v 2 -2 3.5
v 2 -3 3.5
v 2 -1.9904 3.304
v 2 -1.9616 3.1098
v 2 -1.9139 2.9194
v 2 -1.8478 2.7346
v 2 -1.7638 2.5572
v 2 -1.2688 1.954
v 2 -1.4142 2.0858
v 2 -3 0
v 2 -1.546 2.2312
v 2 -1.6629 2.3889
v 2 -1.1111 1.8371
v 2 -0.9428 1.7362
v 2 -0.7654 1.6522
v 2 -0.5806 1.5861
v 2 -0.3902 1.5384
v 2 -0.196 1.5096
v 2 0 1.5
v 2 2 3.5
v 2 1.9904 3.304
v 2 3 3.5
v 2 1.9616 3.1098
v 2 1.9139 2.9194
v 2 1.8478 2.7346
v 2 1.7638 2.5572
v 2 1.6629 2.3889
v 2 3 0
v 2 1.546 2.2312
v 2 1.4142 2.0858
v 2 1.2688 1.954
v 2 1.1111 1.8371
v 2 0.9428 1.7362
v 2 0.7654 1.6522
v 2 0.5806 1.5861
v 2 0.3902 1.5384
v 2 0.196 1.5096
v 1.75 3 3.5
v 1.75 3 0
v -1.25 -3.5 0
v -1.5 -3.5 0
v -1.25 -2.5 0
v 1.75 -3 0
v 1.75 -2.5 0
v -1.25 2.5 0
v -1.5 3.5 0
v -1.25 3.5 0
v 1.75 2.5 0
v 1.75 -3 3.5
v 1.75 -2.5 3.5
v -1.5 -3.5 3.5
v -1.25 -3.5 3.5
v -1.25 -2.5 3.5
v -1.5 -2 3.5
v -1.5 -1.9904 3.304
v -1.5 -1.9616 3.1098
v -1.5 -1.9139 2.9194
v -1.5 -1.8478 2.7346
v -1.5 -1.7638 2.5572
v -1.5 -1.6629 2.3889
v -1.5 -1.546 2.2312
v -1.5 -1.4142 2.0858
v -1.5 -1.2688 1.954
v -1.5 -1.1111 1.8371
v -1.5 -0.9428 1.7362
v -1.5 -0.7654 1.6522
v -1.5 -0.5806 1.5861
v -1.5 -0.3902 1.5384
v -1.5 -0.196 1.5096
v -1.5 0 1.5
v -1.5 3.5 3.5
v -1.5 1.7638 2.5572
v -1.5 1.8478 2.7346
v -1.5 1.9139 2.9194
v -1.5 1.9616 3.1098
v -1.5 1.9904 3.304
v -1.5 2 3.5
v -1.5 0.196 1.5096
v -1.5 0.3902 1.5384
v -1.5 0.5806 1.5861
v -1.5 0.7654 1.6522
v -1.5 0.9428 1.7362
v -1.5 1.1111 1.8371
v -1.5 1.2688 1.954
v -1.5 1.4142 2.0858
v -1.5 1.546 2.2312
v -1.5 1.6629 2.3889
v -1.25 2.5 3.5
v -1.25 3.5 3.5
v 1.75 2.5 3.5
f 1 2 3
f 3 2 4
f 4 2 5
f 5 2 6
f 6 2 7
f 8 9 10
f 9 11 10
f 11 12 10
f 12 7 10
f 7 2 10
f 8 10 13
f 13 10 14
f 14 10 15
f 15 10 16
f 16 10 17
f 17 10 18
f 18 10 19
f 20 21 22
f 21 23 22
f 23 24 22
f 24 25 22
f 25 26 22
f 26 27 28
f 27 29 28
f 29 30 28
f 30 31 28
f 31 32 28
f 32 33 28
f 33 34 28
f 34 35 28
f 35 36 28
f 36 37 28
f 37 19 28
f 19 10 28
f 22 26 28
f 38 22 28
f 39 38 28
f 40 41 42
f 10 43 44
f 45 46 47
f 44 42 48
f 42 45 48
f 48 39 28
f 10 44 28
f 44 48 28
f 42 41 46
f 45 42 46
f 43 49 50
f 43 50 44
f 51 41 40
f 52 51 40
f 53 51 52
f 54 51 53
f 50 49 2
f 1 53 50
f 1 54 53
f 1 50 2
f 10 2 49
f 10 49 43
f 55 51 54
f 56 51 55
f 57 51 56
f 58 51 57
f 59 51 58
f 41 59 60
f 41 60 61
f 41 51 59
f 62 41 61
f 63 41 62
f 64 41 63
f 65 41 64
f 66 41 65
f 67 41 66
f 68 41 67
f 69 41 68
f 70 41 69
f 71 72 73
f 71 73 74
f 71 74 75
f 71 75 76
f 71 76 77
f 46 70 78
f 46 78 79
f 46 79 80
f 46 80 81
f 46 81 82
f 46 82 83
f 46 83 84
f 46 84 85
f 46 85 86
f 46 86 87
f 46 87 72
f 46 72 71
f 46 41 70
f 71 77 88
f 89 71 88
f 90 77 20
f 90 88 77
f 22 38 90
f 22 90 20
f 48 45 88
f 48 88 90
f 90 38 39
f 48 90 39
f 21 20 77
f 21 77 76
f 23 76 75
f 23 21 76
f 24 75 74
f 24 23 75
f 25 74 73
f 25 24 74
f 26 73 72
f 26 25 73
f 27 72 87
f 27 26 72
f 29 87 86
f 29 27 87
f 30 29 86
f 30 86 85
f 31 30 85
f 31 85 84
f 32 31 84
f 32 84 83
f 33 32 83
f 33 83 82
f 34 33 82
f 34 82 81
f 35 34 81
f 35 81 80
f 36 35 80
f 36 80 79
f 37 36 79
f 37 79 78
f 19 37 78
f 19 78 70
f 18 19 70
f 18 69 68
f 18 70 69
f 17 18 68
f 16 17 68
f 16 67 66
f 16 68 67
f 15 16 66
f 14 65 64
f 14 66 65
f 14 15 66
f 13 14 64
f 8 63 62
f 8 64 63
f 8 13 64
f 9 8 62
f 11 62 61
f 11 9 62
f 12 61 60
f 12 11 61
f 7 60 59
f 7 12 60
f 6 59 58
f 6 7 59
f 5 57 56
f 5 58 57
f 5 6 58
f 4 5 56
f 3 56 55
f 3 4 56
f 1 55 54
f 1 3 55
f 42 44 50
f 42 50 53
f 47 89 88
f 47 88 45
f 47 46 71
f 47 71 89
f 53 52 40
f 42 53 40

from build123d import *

# Parameters (mm, degrees)
ESQUISSE1_W             = 3.5
ESQUISSE1_H             = 7
BOSS_EXTRU_1_DEPTH      = 3.5
ESQUISSE2_W             = 3
ESQUISSE2_H             = 3.5
ENL_V_MAT_EXTRU_1_DEPTH = 1
ESQUISSE3_W             = 3
ESQUISSE3_H             = 3.5
ENL_V_MAT_EXTRU_2_DEPTH = 1
ENL_V_MAT_EXTRU_4_DEPTH = 10
ESQUISSE6_W             = 3.5
ESQUISSE6_H             = 0.5
ENL_V_MAT_EXTRU_5_DEPTH = 2


with BuildPart() as part:
    # Esquisse1 → Boss.-Extru.1 (new body)
    with BuildSketch(Plane.XY):
        with Locations((0.25, 0)):
            Rectangle(ESQUISSE1_W, ESQUISSE1_H)
    extrude(amount=BOSS_EXTRU_1_DEPTH)

    # Esquisse2 → Enlèv. mat.-Extru.1 (cut)
    with BuildSketch(Plane(origin=(0, 3.5, 0), x_dir=(1, 0, 0), z_dir=(0, 1, 0))):
        with Locations((0.25, -1.75)):
            Rectangle(ESQUISSE2_W, ESQUISSE2_H)
    extrude(amount=-ENL_V_MAT_EXTRU_1_DEPTH, mode=Mode.SUBTRACT)

    # Esquisse3 → Enlèv. mat.-Extru.2 (cut)
    with BuildSketch(Plane(origin=(0, -3.5, 0), x_dir=(-1, 0, 0), z_dir=(0, -1, 0))):
        with Locations((-0.25, -1.75)):
            Rectangle(ESQUISSE3_W, ESQUISSE3_H)
    extrude(amount=-ENL_V_MAT_EXTRU_2_DEPTH, mode=Mode.SUBTRACT)

    # Esquisse5 → Enlèv. mat.-Extru.4 (cut)
    with BuildSketch(Plane(origin=(2, 0, 0), x_dir=(0, 0, -1), z_dir=(1, 0, 0))):
        with BuildLine():
            Line((-3.5, -2), (-3.5, 2))
            ThreePointArc((-3.5, 2), (-1.5, 0), (-3.5, -2))
        make_face()
    extrude(amount=-ENL_V_MAT_EXTRU_4_DEPTH, mode=Mode.SUBTRACT)

    # Esquisse6 → Enlèv. mat.-Extru.5 (cut)
    with BuildSketch(Plane(origin=(2, 0, 0), x_dir=(0, 0, -1), z_dir=(1, 0, 0))):
        with Locations((-1.75, 3.25)):
            Rectangle(ESQUISSE6_W, ESQUISSE6_H)
        with Locations((-1.75, -3.25)):
            Rectangle(ESQUISSE6_W, ESQUISSE6_H)
    extrude(amount=-ENL_V_MAT_EXTRU_5_DEPTH, mode=Mode.SUBTRACT)


solid = part.part
